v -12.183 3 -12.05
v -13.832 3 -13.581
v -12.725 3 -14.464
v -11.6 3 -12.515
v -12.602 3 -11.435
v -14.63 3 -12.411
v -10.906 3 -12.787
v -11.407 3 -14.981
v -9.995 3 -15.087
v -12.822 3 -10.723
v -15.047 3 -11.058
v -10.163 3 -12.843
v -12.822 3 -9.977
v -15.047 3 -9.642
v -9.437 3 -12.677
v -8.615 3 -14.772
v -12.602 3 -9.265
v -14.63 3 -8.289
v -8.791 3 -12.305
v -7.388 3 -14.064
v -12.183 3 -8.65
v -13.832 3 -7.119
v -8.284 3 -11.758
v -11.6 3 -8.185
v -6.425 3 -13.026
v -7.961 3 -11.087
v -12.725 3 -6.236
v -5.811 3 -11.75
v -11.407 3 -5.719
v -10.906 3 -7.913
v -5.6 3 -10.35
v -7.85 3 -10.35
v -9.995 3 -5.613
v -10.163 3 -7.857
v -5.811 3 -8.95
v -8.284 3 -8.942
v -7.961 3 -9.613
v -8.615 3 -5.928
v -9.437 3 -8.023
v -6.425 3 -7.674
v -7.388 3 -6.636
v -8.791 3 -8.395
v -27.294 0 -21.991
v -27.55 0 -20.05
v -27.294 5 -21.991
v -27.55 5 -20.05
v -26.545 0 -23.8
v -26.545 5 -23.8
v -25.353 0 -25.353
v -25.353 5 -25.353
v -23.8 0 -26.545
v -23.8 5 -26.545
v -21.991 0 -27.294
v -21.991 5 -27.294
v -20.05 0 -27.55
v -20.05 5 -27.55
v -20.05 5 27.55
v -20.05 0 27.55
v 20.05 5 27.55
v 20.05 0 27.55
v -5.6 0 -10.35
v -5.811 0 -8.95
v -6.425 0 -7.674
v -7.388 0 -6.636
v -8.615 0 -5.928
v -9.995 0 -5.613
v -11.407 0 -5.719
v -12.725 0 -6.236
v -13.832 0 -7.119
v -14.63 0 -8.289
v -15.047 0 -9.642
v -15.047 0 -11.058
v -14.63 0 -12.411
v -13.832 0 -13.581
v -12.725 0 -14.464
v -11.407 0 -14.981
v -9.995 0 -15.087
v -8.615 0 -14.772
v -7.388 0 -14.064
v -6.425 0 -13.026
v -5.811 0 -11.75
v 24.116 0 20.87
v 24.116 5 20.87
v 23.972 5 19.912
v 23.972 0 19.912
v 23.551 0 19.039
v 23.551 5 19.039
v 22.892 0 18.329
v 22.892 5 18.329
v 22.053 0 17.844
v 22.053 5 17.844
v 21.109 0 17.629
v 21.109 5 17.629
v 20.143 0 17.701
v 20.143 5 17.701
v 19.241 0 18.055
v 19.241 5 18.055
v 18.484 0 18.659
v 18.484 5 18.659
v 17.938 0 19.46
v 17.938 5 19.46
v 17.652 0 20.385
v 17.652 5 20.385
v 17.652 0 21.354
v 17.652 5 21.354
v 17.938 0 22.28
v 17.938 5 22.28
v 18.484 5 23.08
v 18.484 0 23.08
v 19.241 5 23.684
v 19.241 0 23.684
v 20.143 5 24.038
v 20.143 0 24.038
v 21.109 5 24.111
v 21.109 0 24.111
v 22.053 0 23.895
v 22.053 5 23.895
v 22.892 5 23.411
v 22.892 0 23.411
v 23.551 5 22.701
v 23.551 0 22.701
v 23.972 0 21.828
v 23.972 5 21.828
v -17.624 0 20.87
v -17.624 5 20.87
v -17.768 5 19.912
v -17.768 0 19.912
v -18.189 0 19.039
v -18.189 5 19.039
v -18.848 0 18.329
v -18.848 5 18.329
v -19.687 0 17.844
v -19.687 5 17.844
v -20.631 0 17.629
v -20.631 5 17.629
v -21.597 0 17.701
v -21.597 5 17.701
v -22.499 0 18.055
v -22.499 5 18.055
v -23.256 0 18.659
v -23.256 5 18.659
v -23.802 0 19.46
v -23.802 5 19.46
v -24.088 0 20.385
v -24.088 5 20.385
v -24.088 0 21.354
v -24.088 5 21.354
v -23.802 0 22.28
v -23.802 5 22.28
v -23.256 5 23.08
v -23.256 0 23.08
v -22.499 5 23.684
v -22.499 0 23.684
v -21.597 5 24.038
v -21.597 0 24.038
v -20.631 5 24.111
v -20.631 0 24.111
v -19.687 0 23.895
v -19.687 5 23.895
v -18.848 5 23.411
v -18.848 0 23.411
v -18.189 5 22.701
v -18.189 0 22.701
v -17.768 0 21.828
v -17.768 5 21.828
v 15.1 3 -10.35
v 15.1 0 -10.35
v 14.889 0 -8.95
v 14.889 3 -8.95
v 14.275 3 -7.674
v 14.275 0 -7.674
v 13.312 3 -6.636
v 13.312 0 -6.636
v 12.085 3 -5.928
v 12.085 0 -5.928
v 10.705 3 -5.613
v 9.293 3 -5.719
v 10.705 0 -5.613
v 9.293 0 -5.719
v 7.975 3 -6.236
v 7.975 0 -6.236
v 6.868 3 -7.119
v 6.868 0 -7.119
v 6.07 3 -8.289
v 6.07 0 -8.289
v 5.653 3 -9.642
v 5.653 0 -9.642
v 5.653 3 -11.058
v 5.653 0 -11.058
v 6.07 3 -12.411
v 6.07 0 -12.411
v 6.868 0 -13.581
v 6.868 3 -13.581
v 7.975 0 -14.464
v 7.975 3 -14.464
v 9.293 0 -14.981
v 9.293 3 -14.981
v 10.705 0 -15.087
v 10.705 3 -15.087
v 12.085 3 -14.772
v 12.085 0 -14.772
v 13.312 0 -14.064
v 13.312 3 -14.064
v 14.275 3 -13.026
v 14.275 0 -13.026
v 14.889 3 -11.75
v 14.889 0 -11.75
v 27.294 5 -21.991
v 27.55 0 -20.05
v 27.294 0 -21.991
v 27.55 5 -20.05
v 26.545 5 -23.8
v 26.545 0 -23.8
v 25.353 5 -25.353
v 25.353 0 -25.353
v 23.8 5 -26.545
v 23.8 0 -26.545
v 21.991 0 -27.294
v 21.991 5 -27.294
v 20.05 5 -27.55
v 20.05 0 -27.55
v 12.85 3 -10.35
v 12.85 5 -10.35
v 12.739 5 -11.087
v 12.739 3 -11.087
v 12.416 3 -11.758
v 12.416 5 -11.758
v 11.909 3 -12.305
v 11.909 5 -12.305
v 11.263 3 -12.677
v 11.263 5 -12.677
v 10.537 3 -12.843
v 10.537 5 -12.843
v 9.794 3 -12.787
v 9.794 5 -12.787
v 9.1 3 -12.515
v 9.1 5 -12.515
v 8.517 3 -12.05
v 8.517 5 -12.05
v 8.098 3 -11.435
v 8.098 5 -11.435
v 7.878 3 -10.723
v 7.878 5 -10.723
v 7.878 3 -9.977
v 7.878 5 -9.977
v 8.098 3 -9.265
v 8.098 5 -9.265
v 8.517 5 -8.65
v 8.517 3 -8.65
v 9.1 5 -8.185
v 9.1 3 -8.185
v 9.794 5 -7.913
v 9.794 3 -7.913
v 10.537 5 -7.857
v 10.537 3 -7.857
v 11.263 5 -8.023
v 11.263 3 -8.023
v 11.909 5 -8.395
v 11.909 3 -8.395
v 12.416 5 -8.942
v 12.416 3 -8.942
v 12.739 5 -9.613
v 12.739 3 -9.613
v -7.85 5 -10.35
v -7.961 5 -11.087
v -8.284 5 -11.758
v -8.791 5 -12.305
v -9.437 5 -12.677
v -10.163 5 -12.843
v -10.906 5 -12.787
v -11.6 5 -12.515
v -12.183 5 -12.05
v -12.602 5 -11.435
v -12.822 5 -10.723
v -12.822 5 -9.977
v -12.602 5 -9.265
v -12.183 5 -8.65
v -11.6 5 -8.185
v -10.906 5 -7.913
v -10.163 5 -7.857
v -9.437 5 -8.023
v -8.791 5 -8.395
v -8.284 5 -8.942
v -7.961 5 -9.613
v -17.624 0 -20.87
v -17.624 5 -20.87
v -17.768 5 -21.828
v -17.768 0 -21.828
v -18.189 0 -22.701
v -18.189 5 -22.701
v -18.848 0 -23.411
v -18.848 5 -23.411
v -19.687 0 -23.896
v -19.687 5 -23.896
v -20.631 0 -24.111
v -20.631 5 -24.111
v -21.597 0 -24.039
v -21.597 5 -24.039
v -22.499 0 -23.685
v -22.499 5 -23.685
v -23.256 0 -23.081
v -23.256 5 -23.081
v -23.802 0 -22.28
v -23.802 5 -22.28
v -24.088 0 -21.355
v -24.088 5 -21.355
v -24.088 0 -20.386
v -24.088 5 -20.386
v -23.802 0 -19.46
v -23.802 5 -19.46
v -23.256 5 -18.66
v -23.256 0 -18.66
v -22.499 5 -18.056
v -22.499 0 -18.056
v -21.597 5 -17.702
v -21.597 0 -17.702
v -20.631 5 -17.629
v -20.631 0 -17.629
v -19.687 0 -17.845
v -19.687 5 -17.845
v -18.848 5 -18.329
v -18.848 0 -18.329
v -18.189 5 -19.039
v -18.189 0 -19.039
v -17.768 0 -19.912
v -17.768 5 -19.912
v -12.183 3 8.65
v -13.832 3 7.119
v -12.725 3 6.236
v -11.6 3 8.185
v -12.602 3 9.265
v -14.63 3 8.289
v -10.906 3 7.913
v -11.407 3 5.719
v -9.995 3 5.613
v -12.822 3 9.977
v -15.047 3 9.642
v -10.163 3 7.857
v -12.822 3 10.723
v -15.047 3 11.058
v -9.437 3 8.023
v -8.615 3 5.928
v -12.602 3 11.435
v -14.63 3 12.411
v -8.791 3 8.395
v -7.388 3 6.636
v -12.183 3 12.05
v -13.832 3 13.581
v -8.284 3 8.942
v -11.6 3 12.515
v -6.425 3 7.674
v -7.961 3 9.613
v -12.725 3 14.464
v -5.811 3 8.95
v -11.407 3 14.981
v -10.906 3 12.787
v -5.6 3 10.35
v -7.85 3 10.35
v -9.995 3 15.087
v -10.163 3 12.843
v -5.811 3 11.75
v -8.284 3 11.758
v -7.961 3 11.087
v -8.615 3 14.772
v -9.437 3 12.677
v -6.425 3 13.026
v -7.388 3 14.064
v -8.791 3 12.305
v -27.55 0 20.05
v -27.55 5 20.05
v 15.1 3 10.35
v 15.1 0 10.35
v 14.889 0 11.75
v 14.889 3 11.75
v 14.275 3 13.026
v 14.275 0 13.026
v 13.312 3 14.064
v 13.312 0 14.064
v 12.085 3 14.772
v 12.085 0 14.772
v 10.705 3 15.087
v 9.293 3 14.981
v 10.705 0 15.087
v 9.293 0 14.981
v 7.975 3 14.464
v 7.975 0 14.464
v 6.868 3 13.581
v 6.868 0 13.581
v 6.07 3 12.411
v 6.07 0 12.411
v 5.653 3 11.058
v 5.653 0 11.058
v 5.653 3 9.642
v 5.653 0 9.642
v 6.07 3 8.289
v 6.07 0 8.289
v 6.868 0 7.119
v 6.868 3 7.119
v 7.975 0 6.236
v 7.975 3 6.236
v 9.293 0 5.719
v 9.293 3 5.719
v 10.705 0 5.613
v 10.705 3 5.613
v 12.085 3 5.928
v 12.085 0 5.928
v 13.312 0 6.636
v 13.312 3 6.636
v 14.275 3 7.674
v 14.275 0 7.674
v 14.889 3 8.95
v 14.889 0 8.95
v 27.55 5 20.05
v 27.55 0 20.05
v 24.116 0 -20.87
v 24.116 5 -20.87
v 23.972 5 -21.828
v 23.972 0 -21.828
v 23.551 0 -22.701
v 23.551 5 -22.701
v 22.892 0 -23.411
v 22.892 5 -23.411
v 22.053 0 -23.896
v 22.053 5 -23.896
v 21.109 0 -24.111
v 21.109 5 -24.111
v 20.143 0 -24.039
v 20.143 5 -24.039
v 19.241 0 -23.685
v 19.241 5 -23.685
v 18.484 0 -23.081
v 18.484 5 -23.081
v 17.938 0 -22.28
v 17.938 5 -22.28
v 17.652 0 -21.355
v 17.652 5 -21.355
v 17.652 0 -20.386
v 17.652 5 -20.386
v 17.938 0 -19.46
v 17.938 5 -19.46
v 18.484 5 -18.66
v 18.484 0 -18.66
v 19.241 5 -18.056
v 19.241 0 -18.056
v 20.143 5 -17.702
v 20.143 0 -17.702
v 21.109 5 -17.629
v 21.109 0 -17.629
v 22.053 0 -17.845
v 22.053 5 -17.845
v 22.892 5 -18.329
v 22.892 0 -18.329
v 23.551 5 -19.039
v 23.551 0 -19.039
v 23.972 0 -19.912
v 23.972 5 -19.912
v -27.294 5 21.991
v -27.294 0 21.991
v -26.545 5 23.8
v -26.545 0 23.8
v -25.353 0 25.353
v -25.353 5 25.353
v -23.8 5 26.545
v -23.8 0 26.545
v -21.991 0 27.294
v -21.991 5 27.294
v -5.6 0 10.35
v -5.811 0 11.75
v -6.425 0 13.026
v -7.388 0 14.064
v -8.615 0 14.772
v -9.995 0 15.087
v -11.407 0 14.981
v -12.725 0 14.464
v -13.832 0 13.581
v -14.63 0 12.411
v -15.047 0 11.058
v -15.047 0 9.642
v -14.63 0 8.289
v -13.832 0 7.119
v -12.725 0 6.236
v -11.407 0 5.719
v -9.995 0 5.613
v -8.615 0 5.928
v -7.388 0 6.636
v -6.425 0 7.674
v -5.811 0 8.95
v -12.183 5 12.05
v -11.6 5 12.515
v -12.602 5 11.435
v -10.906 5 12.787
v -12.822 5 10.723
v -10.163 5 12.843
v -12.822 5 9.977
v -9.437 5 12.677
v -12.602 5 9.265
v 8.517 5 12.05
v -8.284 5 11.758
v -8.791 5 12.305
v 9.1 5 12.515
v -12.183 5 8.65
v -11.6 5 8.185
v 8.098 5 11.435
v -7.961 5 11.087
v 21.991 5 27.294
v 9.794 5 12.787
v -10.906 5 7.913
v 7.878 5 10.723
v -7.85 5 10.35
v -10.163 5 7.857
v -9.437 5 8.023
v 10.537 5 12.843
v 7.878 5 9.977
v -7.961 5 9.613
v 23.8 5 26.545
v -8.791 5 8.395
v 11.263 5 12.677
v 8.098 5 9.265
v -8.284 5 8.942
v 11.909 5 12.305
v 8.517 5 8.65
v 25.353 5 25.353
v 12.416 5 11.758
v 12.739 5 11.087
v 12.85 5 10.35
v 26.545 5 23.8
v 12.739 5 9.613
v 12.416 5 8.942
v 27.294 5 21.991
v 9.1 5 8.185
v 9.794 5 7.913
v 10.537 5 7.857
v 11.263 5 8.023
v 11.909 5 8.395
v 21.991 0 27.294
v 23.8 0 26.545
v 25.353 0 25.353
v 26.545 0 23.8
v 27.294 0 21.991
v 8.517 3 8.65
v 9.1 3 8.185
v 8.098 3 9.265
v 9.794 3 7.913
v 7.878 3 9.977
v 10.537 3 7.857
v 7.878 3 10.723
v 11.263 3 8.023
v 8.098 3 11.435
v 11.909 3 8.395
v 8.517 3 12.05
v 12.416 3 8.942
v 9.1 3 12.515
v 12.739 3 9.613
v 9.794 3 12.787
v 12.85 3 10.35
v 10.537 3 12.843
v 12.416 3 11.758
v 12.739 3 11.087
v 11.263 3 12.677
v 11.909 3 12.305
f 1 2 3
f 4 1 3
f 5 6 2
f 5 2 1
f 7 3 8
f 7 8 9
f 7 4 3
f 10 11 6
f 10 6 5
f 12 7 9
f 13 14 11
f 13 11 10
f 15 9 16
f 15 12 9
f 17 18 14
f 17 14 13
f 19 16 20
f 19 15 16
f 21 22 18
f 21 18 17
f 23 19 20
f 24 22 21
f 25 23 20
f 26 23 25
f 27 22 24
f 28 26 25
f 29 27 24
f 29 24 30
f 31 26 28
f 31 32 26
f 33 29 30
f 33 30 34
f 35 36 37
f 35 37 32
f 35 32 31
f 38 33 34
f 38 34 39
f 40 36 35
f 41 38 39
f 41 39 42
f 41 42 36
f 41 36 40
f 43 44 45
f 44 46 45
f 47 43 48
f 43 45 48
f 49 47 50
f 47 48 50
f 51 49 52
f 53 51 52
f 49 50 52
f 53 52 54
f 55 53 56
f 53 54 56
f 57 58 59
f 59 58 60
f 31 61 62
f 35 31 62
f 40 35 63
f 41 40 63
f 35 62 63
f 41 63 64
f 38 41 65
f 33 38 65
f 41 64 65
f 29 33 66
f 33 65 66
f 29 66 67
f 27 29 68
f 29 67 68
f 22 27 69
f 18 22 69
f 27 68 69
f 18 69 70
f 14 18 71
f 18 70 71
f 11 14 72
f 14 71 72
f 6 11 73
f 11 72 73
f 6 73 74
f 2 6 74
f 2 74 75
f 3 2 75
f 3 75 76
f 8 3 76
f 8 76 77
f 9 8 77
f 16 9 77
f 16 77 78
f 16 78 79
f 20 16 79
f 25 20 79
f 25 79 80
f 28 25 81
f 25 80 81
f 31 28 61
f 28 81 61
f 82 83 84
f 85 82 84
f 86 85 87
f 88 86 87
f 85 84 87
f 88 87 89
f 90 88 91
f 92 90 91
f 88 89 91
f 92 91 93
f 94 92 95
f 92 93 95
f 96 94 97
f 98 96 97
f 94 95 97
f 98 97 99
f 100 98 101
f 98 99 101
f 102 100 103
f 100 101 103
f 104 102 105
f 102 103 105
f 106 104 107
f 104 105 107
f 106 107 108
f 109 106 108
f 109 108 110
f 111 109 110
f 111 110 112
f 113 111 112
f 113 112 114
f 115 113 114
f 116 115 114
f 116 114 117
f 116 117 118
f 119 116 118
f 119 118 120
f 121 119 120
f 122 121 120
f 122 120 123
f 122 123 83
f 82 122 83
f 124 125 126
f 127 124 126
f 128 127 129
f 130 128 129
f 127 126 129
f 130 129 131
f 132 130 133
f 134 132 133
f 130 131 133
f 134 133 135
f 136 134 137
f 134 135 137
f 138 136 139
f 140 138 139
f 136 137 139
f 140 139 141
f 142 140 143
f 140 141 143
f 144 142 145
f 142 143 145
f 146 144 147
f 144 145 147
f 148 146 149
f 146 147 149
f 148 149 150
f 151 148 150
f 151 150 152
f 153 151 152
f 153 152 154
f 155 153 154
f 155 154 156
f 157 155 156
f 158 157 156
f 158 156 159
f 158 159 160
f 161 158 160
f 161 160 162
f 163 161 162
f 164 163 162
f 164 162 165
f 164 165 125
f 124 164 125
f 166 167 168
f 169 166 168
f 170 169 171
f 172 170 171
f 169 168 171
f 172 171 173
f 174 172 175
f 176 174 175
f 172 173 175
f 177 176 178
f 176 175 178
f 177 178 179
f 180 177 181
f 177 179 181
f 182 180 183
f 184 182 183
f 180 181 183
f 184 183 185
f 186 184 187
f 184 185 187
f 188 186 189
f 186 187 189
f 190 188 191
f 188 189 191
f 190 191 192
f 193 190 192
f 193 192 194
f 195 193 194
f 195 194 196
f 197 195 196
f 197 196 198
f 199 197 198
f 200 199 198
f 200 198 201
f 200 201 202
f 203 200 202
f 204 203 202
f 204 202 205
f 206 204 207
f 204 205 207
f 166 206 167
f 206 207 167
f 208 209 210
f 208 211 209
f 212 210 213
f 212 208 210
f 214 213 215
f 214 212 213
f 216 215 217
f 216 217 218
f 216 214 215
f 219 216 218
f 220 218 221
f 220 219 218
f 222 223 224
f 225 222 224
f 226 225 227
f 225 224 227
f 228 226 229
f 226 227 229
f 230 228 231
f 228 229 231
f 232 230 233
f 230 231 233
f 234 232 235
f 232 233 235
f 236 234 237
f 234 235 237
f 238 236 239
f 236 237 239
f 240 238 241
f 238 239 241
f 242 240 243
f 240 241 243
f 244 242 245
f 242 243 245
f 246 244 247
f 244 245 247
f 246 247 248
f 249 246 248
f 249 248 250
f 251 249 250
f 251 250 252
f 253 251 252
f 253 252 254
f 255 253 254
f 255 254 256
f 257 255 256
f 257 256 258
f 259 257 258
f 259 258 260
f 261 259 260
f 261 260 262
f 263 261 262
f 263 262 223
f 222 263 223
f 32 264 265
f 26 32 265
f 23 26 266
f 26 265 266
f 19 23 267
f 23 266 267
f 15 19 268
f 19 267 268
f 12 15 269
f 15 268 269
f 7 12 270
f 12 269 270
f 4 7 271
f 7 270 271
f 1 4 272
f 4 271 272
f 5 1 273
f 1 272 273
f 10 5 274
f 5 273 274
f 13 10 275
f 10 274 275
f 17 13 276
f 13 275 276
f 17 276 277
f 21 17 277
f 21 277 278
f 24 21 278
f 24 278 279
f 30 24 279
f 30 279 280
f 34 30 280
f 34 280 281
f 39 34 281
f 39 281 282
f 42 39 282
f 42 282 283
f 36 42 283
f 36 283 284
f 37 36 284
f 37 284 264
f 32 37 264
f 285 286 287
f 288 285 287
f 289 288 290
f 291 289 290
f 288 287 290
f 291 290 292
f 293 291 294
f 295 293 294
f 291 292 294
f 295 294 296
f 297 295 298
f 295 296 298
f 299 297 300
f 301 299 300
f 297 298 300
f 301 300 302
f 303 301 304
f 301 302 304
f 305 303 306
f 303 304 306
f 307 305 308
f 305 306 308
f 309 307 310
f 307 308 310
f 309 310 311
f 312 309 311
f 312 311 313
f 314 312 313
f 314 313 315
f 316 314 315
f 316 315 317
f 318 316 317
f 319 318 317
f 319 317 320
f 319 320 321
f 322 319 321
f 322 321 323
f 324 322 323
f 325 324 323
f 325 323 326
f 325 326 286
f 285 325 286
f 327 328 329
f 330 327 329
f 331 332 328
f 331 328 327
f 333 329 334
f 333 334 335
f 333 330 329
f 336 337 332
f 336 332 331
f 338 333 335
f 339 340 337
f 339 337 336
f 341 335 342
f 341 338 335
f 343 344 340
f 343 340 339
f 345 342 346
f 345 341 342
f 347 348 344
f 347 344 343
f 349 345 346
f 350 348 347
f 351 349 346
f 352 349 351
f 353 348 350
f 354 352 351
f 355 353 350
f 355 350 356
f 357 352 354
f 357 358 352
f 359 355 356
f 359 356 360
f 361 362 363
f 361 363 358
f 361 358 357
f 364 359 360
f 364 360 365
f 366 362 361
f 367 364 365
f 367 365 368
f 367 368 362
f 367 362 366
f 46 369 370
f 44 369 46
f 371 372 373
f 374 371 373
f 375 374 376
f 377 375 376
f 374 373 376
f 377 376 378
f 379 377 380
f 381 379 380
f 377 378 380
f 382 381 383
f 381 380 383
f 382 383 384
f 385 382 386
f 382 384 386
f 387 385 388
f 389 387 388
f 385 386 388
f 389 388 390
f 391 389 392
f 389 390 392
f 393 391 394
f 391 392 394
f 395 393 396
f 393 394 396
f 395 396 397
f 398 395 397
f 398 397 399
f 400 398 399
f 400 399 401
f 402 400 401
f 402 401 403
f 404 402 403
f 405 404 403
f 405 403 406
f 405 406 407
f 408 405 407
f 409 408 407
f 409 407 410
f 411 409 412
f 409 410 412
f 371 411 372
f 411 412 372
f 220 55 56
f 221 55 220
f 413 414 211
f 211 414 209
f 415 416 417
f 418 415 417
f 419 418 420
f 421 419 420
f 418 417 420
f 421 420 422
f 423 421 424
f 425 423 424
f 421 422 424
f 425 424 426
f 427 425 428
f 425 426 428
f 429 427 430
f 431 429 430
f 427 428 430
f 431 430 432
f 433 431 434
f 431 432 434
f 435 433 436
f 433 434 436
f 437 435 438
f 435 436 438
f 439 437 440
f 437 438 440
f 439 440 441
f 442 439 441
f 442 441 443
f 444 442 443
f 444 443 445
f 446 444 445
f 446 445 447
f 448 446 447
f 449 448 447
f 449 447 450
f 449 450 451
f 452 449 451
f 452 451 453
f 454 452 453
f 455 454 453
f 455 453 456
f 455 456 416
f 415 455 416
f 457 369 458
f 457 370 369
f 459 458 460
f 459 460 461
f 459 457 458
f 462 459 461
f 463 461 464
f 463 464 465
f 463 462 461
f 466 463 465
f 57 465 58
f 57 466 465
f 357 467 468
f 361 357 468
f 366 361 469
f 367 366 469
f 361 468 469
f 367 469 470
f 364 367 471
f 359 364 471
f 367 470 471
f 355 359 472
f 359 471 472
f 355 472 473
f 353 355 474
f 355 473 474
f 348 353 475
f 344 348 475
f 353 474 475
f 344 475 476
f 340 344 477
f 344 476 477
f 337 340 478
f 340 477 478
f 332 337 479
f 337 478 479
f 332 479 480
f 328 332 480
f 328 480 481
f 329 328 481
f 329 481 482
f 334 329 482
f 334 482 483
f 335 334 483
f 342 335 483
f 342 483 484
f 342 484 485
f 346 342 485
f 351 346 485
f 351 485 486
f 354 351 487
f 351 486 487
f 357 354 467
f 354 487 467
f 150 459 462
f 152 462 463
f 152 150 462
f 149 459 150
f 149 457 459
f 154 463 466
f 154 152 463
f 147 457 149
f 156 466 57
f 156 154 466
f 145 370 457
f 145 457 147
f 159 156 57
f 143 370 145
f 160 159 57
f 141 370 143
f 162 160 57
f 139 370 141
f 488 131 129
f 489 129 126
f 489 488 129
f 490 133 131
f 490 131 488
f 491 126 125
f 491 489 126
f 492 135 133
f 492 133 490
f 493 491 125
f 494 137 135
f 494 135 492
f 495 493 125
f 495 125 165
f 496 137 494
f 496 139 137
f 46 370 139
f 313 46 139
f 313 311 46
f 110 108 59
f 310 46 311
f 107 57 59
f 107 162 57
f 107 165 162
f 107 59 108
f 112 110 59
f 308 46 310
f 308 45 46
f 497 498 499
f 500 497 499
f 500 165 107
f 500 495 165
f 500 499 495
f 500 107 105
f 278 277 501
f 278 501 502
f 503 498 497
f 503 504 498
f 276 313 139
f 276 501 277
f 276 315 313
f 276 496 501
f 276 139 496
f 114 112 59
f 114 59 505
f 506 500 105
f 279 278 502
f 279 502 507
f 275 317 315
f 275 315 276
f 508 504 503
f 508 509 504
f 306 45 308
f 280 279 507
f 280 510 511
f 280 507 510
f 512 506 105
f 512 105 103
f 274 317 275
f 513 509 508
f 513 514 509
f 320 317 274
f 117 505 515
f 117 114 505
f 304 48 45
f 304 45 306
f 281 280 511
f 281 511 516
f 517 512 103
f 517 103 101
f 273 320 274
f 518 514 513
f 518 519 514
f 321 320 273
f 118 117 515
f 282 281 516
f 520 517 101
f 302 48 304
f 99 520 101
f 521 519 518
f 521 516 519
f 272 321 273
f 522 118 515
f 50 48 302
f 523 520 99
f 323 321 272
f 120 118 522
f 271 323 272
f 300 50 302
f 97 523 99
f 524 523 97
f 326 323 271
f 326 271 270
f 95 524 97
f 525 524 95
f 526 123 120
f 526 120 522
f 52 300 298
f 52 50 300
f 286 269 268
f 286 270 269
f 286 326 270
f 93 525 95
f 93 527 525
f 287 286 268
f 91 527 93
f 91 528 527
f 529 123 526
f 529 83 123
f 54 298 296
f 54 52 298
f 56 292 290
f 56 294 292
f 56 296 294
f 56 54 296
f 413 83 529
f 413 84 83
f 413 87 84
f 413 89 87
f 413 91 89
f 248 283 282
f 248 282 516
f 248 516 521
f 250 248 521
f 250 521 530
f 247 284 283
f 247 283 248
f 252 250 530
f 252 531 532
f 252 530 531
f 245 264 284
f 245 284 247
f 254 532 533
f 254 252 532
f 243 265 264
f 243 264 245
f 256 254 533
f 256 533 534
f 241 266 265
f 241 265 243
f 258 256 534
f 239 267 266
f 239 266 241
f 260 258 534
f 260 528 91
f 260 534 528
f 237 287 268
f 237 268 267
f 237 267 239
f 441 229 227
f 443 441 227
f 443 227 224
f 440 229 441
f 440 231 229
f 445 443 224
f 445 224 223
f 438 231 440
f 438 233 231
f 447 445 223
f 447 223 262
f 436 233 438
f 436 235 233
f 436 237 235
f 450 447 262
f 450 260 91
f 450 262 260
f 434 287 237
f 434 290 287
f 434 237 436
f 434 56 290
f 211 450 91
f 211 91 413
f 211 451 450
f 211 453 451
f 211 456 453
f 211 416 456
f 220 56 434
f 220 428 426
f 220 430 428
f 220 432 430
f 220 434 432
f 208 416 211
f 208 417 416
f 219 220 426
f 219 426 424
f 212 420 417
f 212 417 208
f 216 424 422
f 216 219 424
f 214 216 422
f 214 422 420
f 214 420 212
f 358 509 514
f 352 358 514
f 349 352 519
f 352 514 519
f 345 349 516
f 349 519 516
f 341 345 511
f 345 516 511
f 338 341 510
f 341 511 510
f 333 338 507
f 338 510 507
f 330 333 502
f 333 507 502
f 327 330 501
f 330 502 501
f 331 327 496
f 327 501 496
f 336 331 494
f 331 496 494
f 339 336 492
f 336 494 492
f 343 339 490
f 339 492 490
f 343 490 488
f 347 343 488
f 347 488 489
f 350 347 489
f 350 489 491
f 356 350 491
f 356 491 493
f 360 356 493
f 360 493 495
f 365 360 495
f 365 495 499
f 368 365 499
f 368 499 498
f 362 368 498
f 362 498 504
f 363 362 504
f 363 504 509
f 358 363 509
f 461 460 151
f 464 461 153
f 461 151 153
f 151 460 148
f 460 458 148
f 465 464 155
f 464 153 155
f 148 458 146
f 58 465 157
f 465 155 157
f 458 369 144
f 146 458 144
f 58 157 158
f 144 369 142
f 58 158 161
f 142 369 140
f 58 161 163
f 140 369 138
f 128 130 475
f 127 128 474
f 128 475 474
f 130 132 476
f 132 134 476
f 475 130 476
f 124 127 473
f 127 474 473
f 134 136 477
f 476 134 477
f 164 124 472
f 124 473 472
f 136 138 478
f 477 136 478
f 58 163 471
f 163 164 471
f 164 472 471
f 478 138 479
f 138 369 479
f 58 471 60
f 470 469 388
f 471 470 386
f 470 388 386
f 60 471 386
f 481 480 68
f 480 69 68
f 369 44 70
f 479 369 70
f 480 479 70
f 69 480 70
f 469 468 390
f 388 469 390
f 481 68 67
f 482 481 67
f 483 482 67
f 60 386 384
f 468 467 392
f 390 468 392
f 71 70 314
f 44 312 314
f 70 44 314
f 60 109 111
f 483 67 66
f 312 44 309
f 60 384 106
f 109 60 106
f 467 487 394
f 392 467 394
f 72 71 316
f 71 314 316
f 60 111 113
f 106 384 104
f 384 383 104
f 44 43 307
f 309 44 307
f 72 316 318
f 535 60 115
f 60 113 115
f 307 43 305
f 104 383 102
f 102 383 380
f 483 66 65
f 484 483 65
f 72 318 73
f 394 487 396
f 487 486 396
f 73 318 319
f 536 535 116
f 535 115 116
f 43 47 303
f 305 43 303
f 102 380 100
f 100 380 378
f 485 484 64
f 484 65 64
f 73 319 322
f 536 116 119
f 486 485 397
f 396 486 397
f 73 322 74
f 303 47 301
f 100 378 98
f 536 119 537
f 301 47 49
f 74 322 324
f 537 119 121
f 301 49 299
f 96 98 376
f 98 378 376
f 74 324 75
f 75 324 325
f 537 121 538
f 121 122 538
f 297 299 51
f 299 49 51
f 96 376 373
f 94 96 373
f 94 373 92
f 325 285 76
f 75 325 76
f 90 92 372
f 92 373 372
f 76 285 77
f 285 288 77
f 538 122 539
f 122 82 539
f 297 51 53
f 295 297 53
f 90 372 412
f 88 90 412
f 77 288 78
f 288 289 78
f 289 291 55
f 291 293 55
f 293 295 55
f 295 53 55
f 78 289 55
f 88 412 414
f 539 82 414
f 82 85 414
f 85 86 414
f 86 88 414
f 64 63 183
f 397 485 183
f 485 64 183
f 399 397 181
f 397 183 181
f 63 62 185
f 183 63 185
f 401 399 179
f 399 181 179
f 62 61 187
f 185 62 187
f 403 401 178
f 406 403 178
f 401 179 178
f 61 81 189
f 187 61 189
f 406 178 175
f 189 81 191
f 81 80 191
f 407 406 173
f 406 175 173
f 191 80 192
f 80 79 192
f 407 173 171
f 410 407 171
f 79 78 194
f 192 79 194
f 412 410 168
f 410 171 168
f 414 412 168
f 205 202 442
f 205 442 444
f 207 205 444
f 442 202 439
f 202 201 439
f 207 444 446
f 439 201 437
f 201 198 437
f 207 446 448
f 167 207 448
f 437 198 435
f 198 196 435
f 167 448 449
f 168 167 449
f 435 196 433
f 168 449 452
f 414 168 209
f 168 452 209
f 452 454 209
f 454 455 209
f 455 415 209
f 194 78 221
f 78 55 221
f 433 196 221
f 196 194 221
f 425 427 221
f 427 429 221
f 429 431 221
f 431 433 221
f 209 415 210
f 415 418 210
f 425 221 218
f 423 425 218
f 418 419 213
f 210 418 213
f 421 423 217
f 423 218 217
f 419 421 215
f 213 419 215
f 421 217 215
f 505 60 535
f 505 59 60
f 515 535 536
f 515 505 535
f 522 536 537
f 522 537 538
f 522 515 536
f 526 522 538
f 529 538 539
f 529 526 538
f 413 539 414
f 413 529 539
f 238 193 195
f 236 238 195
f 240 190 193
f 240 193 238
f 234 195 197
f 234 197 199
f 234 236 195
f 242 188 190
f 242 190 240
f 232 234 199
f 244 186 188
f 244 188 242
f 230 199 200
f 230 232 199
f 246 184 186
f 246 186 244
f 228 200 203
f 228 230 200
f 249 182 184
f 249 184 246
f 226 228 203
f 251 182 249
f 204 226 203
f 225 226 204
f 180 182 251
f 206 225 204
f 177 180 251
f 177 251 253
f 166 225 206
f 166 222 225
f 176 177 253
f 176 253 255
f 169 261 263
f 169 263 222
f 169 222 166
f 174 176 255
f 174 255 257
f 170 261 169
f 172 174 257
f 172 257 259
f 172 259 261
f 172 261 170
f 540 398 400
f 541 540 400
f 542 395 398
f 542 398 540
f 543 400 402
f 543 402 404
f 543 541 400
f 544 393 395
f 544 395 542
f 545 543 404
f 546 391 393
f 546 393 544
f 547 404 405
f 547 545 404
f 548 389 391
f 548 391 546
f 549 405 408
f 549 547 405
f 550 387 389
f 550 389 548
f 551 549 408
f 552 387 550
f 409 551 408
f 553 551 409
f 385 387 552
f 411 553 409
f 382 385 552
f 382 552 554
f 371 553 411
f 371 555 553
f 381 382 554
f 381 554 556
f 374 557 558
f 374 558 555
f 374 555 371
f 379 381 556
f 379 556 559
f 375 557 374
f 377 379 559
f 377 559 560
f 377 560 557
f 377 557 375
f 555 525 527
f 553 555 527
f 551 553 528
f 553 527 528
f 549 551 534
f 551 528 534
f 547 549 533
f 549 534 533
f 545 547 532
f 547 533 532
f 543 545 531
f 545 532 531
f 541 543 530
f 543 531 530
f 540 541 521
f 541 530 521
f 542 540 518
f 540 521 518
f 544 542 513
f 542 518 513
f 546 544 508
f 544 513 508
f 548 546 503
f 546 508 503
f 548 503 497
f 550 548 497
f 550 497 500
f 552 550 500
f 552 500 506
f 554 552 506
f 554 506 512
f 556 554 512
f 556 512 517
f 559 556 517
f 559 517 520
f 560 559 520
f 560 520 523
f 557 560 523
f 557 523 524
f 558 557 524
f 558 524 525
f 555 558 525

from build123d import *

# Parameters (mm, degrees)
SKETCH1_W           = 55.1
SKETCH1_H           = 55.1
BOSS_EXTRUDE1_DEPTH = 5
FILLET1_R           = 7.5
SKETCH2_R           = 3.25
CUT_EXTRUDE1_DEPTH  = 6
SKETCH3_R           = 2.5
CUT_EXTRUDE2_DEPTH  = 5
SKETCH4_R           = 4.75
CUT_EXTRUDE3_DEPTH  = 3


with BuildPart() as part:
    # Sketch1 → Boss-Extrude1 (new body)
    with BuildSketch(Plane(origin=(0, 0, 0), x_dir=(1, 0, 0), z_dir=(0, 1, 0))):
        Rectangle(SKETCH1_W, SKETCH1_H)
    extrude(amount=BOSS_EXTRUDE1_DEPTH)

    # Fillet1
    fillet1_edges = [part.edges().sort_by_distance(p)[0] for p in [
        (27.55, 2.5, 27.55),
        (-27.55, 2.5, 27.55),
        (-27.55, 2.5, -27.55),
        (27.55, 2.5, -27.55),
    ]]
    fillet(fillet1_edges, radius=FILLET1_R)

    # Sketch2 → Cut-Extrude1 (cut, through all)
    with BuildSketch(Plane(origin=(0, 5, 0), x_dir=(1, 0, 0), z_dir=(0, 1, 0))):
        with Locations((-20.874050615, 20.870277104)):
            Circle(SKETCH2_R)
        with Locations((-20.874050615, -20.869722896)):
            Circle(SKETCH2_R)
        with Locations((20.865949385, 20.870277104)):
            Circle(SKETCH2_R)
        with Locations((20.865949385, -20.869722896)):
            Circle(SKETCH2_R)
    extrude(amount=-CUT_EXTRUDE1_DEPTH, mode=Mode.SUBTRACT)

    # Sketch3 → Cut-Extrude2 (cut)
    with BuildSketch(Plane(origin=(0, 5, 0), x_dir=(1, 0, 0), z_dir=(0, 1, 0))):
        with Locations((-10.35, 10.35)):
            Circle(SKETCH3_R)
        with Locations((10.35, 10.35)):
            Circle(SKETCH3_R)
        with Locations((-10.35, -10.35)):
            Circle(SKETCH3_R)
        with Locations((10.35, -10.35)):
            Circle(SKETCH3_R)
    extrude(amount=-CUT_EXTRUDE2_DEPTH, mode=Mode.SUBTRACT)

    # Sketch4 → Cut-Extrude3 (cut)
    with BuildSketch(Plane.XZ):
        with Locations((-10.35, 10.35)):
            Circle(SKETCH4_R)
        with Locations((10.35, 10.35)):
            Circle(SKETCH4_R)
        with Locations((10.35, -10.35)):
            Circle(SKETCH4_R)
        with Locations((-10.35, -10.35)):
            Circle(SKETCH4_R)
    extrude(amount=-CUT_EXTRUDE3_DEPTH, mode=Mode.SUBTRACT)


solid = part.part
